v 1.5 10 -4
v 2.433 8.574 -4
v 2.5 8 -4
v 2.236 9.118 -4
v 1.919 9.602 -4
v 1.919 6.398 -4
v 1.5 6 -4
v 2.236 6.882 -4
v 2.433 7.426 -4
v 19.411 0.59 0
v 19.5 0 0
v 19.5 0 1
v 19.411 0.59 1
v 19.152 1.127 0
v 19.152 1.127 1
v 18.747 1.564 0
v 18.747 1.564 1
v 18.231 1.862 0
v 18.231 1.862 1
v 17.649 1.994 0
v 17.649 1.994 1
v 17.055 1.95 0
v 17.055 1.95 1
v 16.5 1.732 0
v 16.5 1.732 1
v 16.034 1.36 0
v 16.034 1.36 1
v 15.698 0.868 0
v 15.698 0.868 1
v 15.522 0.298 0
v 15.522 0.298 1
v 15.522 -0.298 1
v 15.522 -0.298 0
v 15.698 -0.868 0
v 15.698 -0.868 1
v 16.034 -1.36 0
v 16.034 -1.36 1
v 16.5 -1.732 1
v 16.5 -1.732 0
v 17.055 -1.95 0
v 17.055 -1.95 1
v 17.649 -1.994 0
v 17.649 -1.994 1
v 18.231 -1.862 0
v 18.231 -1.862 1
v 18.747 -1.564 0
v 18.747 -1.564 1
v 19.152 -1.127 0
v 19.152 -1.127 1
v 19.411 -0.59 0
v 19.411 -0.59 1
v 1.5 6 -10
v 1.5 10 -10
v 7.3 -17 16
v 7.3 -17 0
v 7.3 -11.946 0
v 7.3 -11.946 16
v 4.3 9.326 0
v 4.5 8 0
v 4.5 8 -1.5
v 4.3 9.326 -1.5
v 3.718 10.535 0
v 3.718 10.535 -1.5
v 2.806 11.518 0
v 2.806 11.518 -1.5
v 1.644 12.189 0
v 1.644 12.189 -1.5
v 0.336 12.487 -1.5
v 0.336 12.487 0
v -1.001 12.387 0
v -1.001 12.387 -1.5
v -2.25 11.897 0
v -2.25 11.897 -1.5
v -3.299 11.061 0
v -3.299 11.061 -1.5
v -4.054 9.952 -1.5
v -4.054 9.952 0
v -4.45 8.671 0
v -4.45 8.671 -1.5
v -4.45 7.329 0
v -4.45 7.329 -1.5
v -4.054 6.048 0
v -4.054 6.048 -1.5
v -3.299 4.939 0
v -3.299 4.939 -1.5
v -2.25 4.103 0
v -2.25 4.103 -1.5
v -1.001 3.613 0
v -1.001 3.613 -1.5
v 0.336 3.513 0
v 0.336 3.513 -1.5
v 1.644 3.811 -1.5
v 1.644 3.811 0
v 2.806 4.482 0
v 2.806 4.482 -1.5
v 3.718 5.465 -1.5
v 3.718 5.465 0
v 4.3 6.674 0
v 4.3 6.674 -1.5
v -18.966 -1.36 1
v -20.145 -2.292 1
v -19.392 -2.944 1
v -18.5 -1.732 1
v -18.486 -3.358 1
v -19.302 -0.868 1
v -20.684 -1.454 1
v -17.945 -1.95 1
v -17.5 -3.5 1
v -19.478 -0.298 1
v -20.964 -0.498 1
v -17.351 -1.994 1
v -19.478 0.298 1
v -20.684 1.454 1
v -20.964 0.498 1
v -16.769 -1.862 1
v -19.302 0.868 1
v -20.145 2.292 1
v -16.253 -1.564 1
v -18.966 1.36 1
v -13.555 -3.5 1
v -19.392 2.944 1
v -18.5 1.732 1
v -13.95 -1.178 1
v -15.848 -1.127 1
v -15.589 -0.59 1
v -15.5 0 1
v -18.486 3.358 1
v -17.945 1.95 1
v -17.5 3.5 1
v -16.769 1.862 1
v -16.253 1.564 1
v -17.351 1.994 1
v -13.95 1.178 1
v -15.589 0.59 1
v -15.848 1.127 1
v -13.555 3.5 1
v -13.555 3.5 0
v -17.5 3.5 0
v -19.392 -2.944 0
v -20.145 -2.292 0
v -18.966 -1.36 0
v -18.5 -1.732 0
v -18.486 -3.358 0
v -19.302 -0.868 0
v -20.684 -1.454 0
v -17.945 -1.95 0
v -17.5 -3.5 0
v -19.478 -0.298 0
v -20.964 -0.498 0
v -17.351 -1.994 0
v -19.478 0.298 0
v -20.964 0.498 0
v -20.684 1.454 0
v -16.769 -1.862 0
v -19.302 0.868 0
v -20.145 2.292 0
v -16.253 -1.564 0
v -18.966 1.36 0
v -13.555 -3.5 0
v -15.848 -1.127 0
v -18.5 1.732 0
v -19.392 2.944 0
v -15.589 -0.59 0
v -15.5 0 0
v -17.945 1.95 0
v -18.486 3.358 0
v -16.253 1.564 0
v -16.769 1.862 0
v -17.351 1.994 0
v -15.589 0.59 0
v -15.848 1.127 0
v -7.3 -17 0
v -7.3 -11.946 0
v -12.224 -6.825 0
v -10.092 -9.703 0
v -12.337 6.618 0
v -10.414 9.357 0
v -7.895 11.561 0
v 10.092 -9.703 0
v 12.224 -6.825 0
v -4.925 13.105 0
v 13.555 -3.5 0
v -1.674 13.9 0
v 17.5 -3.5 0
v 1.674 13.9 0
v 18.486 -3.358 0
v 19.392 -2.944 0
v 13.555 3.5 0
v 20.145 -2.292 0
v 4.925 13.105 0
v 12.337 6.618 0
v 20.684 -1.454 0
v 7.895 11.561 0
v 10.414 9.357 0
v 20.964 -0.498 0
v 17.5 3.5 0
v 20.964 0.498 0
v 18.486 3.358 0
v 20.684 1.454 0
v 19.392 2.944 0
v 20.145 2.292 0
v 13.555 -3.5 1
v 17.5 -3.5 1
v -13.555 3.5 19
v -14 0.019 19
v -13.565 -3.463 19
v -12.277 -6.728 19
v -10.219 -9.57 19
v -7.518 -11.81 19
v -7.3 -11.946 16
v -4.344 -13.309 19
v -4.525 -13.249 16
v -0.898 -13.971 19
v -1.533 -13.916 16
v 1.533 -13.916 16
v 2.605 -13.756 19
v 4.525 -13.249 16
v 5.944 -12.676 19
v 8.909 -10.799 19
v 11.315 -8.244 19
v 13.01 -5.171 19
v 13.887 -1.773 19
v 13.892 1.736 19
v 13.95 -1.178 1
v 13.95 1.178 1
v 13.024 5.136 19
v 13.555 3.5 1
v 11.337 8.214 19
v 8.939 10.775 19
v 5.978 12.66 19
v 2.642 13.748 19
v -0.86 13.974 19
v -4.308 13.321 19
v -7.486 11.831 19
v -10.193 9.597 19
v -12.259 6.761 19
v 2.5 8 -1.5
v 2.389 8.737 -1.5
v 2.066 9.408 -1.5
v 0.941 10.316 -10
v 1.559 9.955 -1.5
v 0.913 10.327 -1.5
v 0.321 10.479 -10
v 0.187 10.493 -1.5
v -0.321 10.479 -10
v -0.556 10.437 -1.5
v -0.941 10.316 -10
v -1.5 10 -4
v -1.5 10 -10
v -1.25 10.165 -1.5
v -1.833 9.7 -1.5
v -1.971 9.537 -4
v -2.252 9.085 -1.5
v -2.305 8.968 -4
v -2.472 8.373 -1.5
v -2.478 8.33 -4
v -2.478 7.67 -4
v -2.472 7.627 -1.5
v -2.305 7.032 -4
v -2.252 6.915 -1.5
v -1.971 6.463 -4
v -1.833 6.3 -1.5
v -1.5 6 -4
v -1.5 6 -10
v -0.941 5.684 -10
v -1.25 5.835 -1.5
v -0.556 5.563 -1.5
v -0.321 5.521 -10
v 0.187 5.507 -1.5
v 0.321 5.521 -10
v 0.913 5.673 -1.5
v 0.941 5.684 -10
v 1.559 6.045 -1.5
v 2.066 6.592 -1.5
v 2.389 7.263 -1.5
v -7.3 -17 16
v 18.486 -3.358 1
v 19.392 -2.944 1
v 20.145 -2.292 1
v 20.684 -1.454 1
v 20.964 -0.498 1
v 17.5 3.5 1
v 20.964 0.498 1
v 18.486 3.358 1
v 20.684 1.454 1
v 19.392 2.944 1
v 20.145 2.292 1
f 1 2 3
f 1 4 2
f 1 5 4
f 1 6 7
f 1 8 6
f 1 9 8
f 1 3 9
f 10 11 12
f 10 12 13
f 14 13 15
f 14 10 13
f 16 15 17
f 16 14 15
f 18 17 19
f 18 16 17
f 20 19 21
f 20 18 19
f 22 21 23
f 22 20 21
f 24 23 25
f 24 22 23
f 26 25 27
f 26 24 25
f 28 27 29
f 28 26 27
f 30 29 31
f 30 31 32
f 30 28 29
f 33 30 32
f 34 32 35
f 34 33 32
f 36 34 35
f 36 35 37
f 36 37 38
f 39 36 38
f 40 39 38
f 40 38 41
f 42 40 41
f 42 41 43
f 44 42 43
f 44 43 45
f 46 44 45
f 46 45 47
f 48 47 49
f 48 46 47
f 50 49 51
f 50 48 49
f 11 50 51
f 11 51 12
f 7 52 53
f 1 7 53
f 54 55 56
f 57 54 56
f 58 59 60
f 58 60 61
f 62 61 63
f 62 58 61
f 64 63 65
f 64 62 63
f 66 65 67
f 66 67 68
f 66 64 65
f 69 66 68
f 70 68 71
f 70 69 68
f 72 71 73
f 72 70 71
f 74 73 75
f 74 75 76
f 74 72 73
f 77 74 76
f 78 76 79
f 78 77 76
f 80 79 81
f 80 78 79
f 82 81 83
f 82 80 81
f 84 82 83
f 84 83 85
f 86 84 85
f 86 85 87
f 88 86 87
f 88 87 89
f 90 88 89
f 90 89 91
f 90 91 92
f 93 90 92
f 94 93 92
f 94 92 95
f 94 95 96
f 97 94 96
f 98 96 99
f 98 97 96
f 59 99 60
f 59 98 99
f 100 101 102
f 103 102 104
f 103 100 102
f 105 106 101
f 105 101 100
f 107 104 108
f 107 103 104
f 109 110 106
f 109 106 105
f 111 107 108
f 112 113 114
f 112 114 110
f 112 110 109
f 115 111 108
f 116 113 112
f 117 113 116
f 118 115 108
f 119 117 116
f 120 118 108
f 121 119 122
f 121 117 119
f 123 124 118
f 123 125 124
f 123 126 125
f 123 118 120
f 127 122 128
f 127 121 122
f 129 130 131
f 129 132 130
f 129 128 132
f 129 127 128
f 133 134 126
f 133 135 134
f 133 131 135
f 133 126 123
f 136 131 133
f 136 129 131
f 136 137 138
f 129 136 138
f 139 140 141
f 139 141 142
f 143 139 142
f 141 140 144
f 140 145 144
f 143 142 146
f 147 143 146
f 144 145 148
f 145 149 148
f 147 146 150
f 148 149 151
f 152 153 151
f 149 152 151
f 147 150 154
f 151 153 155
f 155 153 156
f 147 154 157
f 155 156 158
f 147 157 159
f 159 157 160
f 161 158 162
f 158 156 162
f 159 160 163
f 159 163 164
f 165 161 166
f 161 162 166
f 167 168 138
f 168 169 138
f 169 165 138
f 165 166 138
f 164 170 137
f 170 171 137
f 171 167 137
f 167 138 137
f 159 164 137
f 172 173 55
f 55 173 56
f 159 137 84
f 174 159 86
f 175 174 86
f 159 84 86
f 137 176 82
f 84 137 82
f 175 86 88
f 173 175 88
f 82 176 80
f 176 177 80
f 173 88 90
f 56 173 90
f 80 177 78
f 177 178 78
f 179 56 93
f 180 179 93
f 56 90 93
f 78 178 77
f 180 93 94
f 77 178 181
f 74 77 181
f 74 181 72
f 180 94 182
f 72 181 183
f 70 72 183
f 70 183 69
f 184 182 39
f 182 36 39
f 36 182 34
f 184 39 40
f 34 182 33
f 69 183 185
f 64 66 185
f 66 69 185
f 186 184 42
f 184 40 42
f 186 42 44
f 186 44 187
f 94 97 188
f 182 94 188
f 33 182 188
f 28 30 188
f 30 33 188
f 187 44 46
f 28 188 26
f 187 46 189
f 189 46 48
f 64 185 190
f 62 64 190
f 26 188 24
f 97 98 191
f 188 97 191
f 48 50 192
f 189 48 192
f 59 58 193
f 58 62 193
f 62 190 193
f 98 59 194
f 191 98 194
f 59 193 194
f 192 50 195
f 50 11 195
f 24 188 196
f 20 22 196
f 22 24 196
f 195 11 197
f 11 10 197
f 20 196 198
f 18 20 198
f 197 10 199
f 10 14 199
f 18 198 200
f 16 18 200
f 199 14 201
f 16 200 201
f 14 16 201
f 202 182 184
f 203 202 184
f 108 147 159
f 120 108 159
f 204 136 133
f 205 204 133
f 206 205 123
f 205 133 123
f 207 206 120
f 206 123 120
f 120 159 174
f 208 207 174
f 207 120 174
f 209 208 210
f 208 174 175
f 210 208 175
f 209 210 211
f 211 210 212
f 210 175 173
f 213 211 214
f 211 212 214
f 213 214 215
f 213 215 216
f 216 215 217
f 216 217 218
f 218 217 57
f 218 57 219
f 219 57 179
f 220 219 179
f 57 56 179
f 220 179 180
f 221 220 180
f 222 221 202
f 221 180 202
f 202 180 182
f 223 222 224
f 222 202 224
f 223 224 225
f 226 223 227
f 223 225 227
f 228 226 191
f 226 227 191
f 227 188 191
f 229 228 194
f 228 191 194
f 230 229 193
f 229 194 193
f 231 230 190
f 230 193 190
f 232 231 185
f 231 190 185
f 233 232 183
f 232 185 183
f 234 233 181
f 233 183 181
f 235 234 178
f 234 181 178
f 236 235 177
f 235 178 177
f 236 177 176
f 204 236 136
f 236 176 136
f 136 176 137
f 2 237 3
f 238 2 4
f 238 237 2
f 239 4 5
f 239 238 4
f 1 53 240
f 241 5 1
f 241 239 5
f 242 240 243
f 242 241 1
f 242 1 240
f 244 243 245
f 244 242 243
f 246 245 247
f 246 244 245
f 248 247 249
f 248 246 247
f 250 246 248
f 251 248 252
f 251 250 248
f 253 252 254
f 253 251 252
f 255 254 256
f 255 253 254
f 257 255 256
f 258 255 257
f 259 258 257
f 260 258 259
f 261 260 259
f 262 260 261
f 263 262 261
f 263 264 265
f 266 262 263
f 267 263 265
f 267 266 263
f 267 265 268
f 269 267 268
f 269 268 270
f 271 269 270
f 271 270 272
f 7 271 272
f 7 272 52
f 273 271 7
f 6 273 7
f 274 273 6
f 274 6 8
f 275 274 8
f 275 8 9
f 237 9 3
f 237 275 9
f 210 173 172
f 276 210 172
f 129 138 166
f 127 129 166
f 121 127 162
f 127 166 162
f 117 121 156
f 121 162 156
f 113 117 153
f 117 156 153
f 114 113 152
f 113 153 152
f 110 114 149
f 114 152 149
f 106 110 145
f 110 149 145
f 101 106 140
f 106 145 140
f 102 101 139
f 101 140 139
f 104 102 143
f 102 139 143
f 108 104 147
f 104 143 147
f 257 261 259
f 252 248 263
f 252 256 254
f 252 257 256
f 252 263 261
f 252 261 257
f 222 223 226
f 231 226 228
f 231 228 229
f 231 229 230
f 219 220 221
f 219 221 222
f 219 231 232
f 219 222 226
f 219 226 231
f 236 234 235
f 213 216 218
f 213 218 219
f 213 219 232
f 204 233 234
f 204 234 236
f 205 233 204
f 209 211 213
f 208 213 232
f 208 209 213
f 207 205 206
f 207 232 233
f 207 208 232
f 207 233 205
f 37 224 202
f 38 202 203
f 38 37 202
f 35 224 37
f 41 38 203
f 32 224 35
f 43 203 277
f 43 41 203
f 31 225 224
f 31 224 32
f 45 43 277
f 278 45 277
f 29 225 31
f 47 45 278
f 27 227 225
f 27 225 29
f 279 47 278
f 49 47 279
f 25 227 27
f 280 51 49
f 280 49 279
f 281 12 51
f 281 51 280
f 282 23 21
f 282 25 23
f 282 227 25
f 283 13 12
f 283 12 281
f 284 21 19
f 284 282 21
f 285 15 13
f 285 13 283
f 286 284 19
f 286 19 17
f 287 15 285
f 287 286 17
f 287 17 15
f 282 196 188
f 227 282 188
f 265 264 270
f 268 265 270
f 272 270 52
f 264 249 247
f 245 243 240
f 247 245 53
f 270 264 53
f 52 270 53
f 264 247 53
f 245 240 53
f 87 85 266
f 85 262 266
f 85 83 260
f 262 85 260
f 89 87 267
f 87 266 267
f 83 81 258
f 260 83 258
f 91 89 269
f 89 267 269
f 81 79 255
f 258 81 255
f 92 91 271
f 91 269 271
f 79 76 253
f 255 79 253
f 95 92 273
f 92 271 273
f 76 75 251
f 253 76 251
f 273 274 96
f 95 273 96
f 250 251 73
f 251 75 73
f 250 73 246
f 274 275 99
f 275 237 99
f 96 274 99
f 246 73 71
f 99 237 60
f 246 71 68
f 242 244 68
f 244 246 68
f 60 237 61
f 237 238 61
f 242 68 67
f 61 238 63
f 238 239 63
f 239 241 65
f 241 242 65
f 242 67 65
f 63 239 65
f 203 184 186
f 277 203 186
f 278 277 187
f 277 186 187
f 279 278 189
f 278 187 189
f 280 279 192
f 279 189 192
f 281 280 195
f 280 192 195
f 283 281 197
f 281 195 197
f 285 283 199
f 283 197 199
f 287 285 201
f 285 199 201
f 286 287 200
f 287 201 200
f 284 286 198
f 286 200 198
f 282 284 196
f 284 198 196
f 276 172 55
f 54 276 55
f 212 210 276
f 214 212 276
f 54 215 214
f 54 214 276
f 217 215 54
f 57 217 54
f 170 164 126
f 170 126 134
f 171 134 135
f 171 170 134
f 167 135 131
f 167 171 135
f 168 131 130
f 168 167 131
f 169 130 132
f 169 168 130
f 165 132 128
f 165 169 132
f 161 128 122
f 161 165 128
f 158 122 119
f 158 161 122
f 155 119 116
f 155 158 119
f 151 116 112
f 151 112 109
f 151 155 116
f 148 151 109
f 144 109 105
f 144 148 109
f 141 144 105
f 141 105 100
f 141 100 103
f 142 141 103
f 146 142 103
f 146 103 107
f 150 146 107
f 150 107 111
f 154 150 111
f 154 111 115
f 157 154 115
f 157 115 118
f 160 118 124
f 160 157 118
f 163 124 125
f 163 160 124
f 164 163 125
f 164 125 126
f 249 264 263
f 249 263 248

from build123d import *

# Parameters (mm, degrees)
ESQUISSE1_R             = 2
BOSS_EXTRU_1_DEPTH      = 1
ESQUISSE1_3_R           = 14
BOSS_EXTRU_2_DEPTH      = 19
BOSS_EXTRU_3_DEPTH      = 16
ESQUISSE1_5_R           = 4.5
BOSS_EXTRU_4_DEPTH      = 1.5
ESQUISSE1_6_R           = 2.5
BOSS_EXTRU_5_DEPTH      = 10
ESQUISSE2_W             = 1
ESQUISSE2_H             = 5
ENL_V_MAT_EXTRU_1_DEPTH = 6


with BuildPart() as part:
    # Esquisse1 → Boss.-Extru.1 (new body)
    with BuildSketch(Plane.XY):
        with BuildLine():
            Line((-7.3, -11.94612908), (-7.3, -17))
            Line((-7.3, -17), (7.3, -17))
            Line((7.3, -17), (7.3, -11.94612908))
            ThreePointArc((7.3, -11.94612908), (11.250406053, -8.332368429), (13.555441712, -3.5))
            Line((13.555441712, -3.5), (17.5, -3.5))
            ThreePointArc((17.5, -3.5), (21, 0), (17.5, 3.5))
            Line((17.5, 3.5), (13.555441712, 3.5))
            ThreePointArc((13.555441712, 3.5), (0, 14), (-13.555441712, 3.5))
            Line((-13.555441712, 3.5), (-17.5, 3.5))
            ThreePointArc((-17.5, 3.5), (-21, 0), (-17.5, -3.5))
            Line((-17.5, -3.5), (-13.555441712, -3.5))
            ThreePointArc((-13.555441712, -3.5), (-11.250406053, -8.332368429), (-7.3, -11.94612908))
        make_face()
        with Locations((-17.5, 0)):
            Circle(ESQUISSE1_R, mode=Mode.SUBTRACT)
        with Locations((17.5, 0)):
            Circle(ESQUISSE1_R, mode=Mode.SUBTRACT)
    extrude(amount=BOSS_EXTRU_1_DEPTH)

    # Esquisse1<3> → Boss.-Extru.2 (add)
    with BuildSketch(Plane.XY):
        Circle(ESQUISSE1_3_R)
    extrude(amount=BOSS_EXTRU_2_DEPTH)

    # Esquisse1<4> → Boss.-Extru.3 (add)
    with BuildSketch(Plane.XY):
        with BuildLine():
            Line((-7.3, -11.94612908), (-7.3, -17))
            Line((-7.3, -17), (7.3, -17))
            Line((7.3, -17), (7.3, -11.94612908))
            ThreePointArc((7.3, -11.94612908), (0, -14), (-7.3, -11.94612908))
        make_face()
    extrude(amount=BOSS_EXTRU_3_DEPTH)

    # Esquisse1<5> → Boss.-Extru.4 (add)
    with BuildSketch(Plane.XY):
        with Locations((0, 8)):
            Circle(ESQUISSE1_5_R)
    extrude(amount=-BOSS_EXTRU_4_DEPTH)

    # Esquisse1<6> → Boss.-Extru.5 (add)
    with BuildSketch(Plane.XY):
        with Locations((0, 8)):
            Circle(ESQUISSE1_6_R)
    extrude(amount=-BOSS_EXTRU_5_DEPTH)

    # Esquisse2 → Enlèv. mat.-Extru.1 (cut)
    with BuildSketch(Plane(origin=(0, 0, -10), x_dir=(-1, 0, 0), z_dir=(0, 0, -1))):
        with Locations((2, 8)):
            Rectangle(ESQUISSE2_W, ESQUISSE2_H)
        with Locations((-2, 8)):
            Rectangle(ESQUISSE2_W, ESQUISSE2_H)
    extrude(amount=-ENL_V_MAT_EXTRU_1_DEPTH, mode=Mode.SUBTRACT)


solid = part.part
